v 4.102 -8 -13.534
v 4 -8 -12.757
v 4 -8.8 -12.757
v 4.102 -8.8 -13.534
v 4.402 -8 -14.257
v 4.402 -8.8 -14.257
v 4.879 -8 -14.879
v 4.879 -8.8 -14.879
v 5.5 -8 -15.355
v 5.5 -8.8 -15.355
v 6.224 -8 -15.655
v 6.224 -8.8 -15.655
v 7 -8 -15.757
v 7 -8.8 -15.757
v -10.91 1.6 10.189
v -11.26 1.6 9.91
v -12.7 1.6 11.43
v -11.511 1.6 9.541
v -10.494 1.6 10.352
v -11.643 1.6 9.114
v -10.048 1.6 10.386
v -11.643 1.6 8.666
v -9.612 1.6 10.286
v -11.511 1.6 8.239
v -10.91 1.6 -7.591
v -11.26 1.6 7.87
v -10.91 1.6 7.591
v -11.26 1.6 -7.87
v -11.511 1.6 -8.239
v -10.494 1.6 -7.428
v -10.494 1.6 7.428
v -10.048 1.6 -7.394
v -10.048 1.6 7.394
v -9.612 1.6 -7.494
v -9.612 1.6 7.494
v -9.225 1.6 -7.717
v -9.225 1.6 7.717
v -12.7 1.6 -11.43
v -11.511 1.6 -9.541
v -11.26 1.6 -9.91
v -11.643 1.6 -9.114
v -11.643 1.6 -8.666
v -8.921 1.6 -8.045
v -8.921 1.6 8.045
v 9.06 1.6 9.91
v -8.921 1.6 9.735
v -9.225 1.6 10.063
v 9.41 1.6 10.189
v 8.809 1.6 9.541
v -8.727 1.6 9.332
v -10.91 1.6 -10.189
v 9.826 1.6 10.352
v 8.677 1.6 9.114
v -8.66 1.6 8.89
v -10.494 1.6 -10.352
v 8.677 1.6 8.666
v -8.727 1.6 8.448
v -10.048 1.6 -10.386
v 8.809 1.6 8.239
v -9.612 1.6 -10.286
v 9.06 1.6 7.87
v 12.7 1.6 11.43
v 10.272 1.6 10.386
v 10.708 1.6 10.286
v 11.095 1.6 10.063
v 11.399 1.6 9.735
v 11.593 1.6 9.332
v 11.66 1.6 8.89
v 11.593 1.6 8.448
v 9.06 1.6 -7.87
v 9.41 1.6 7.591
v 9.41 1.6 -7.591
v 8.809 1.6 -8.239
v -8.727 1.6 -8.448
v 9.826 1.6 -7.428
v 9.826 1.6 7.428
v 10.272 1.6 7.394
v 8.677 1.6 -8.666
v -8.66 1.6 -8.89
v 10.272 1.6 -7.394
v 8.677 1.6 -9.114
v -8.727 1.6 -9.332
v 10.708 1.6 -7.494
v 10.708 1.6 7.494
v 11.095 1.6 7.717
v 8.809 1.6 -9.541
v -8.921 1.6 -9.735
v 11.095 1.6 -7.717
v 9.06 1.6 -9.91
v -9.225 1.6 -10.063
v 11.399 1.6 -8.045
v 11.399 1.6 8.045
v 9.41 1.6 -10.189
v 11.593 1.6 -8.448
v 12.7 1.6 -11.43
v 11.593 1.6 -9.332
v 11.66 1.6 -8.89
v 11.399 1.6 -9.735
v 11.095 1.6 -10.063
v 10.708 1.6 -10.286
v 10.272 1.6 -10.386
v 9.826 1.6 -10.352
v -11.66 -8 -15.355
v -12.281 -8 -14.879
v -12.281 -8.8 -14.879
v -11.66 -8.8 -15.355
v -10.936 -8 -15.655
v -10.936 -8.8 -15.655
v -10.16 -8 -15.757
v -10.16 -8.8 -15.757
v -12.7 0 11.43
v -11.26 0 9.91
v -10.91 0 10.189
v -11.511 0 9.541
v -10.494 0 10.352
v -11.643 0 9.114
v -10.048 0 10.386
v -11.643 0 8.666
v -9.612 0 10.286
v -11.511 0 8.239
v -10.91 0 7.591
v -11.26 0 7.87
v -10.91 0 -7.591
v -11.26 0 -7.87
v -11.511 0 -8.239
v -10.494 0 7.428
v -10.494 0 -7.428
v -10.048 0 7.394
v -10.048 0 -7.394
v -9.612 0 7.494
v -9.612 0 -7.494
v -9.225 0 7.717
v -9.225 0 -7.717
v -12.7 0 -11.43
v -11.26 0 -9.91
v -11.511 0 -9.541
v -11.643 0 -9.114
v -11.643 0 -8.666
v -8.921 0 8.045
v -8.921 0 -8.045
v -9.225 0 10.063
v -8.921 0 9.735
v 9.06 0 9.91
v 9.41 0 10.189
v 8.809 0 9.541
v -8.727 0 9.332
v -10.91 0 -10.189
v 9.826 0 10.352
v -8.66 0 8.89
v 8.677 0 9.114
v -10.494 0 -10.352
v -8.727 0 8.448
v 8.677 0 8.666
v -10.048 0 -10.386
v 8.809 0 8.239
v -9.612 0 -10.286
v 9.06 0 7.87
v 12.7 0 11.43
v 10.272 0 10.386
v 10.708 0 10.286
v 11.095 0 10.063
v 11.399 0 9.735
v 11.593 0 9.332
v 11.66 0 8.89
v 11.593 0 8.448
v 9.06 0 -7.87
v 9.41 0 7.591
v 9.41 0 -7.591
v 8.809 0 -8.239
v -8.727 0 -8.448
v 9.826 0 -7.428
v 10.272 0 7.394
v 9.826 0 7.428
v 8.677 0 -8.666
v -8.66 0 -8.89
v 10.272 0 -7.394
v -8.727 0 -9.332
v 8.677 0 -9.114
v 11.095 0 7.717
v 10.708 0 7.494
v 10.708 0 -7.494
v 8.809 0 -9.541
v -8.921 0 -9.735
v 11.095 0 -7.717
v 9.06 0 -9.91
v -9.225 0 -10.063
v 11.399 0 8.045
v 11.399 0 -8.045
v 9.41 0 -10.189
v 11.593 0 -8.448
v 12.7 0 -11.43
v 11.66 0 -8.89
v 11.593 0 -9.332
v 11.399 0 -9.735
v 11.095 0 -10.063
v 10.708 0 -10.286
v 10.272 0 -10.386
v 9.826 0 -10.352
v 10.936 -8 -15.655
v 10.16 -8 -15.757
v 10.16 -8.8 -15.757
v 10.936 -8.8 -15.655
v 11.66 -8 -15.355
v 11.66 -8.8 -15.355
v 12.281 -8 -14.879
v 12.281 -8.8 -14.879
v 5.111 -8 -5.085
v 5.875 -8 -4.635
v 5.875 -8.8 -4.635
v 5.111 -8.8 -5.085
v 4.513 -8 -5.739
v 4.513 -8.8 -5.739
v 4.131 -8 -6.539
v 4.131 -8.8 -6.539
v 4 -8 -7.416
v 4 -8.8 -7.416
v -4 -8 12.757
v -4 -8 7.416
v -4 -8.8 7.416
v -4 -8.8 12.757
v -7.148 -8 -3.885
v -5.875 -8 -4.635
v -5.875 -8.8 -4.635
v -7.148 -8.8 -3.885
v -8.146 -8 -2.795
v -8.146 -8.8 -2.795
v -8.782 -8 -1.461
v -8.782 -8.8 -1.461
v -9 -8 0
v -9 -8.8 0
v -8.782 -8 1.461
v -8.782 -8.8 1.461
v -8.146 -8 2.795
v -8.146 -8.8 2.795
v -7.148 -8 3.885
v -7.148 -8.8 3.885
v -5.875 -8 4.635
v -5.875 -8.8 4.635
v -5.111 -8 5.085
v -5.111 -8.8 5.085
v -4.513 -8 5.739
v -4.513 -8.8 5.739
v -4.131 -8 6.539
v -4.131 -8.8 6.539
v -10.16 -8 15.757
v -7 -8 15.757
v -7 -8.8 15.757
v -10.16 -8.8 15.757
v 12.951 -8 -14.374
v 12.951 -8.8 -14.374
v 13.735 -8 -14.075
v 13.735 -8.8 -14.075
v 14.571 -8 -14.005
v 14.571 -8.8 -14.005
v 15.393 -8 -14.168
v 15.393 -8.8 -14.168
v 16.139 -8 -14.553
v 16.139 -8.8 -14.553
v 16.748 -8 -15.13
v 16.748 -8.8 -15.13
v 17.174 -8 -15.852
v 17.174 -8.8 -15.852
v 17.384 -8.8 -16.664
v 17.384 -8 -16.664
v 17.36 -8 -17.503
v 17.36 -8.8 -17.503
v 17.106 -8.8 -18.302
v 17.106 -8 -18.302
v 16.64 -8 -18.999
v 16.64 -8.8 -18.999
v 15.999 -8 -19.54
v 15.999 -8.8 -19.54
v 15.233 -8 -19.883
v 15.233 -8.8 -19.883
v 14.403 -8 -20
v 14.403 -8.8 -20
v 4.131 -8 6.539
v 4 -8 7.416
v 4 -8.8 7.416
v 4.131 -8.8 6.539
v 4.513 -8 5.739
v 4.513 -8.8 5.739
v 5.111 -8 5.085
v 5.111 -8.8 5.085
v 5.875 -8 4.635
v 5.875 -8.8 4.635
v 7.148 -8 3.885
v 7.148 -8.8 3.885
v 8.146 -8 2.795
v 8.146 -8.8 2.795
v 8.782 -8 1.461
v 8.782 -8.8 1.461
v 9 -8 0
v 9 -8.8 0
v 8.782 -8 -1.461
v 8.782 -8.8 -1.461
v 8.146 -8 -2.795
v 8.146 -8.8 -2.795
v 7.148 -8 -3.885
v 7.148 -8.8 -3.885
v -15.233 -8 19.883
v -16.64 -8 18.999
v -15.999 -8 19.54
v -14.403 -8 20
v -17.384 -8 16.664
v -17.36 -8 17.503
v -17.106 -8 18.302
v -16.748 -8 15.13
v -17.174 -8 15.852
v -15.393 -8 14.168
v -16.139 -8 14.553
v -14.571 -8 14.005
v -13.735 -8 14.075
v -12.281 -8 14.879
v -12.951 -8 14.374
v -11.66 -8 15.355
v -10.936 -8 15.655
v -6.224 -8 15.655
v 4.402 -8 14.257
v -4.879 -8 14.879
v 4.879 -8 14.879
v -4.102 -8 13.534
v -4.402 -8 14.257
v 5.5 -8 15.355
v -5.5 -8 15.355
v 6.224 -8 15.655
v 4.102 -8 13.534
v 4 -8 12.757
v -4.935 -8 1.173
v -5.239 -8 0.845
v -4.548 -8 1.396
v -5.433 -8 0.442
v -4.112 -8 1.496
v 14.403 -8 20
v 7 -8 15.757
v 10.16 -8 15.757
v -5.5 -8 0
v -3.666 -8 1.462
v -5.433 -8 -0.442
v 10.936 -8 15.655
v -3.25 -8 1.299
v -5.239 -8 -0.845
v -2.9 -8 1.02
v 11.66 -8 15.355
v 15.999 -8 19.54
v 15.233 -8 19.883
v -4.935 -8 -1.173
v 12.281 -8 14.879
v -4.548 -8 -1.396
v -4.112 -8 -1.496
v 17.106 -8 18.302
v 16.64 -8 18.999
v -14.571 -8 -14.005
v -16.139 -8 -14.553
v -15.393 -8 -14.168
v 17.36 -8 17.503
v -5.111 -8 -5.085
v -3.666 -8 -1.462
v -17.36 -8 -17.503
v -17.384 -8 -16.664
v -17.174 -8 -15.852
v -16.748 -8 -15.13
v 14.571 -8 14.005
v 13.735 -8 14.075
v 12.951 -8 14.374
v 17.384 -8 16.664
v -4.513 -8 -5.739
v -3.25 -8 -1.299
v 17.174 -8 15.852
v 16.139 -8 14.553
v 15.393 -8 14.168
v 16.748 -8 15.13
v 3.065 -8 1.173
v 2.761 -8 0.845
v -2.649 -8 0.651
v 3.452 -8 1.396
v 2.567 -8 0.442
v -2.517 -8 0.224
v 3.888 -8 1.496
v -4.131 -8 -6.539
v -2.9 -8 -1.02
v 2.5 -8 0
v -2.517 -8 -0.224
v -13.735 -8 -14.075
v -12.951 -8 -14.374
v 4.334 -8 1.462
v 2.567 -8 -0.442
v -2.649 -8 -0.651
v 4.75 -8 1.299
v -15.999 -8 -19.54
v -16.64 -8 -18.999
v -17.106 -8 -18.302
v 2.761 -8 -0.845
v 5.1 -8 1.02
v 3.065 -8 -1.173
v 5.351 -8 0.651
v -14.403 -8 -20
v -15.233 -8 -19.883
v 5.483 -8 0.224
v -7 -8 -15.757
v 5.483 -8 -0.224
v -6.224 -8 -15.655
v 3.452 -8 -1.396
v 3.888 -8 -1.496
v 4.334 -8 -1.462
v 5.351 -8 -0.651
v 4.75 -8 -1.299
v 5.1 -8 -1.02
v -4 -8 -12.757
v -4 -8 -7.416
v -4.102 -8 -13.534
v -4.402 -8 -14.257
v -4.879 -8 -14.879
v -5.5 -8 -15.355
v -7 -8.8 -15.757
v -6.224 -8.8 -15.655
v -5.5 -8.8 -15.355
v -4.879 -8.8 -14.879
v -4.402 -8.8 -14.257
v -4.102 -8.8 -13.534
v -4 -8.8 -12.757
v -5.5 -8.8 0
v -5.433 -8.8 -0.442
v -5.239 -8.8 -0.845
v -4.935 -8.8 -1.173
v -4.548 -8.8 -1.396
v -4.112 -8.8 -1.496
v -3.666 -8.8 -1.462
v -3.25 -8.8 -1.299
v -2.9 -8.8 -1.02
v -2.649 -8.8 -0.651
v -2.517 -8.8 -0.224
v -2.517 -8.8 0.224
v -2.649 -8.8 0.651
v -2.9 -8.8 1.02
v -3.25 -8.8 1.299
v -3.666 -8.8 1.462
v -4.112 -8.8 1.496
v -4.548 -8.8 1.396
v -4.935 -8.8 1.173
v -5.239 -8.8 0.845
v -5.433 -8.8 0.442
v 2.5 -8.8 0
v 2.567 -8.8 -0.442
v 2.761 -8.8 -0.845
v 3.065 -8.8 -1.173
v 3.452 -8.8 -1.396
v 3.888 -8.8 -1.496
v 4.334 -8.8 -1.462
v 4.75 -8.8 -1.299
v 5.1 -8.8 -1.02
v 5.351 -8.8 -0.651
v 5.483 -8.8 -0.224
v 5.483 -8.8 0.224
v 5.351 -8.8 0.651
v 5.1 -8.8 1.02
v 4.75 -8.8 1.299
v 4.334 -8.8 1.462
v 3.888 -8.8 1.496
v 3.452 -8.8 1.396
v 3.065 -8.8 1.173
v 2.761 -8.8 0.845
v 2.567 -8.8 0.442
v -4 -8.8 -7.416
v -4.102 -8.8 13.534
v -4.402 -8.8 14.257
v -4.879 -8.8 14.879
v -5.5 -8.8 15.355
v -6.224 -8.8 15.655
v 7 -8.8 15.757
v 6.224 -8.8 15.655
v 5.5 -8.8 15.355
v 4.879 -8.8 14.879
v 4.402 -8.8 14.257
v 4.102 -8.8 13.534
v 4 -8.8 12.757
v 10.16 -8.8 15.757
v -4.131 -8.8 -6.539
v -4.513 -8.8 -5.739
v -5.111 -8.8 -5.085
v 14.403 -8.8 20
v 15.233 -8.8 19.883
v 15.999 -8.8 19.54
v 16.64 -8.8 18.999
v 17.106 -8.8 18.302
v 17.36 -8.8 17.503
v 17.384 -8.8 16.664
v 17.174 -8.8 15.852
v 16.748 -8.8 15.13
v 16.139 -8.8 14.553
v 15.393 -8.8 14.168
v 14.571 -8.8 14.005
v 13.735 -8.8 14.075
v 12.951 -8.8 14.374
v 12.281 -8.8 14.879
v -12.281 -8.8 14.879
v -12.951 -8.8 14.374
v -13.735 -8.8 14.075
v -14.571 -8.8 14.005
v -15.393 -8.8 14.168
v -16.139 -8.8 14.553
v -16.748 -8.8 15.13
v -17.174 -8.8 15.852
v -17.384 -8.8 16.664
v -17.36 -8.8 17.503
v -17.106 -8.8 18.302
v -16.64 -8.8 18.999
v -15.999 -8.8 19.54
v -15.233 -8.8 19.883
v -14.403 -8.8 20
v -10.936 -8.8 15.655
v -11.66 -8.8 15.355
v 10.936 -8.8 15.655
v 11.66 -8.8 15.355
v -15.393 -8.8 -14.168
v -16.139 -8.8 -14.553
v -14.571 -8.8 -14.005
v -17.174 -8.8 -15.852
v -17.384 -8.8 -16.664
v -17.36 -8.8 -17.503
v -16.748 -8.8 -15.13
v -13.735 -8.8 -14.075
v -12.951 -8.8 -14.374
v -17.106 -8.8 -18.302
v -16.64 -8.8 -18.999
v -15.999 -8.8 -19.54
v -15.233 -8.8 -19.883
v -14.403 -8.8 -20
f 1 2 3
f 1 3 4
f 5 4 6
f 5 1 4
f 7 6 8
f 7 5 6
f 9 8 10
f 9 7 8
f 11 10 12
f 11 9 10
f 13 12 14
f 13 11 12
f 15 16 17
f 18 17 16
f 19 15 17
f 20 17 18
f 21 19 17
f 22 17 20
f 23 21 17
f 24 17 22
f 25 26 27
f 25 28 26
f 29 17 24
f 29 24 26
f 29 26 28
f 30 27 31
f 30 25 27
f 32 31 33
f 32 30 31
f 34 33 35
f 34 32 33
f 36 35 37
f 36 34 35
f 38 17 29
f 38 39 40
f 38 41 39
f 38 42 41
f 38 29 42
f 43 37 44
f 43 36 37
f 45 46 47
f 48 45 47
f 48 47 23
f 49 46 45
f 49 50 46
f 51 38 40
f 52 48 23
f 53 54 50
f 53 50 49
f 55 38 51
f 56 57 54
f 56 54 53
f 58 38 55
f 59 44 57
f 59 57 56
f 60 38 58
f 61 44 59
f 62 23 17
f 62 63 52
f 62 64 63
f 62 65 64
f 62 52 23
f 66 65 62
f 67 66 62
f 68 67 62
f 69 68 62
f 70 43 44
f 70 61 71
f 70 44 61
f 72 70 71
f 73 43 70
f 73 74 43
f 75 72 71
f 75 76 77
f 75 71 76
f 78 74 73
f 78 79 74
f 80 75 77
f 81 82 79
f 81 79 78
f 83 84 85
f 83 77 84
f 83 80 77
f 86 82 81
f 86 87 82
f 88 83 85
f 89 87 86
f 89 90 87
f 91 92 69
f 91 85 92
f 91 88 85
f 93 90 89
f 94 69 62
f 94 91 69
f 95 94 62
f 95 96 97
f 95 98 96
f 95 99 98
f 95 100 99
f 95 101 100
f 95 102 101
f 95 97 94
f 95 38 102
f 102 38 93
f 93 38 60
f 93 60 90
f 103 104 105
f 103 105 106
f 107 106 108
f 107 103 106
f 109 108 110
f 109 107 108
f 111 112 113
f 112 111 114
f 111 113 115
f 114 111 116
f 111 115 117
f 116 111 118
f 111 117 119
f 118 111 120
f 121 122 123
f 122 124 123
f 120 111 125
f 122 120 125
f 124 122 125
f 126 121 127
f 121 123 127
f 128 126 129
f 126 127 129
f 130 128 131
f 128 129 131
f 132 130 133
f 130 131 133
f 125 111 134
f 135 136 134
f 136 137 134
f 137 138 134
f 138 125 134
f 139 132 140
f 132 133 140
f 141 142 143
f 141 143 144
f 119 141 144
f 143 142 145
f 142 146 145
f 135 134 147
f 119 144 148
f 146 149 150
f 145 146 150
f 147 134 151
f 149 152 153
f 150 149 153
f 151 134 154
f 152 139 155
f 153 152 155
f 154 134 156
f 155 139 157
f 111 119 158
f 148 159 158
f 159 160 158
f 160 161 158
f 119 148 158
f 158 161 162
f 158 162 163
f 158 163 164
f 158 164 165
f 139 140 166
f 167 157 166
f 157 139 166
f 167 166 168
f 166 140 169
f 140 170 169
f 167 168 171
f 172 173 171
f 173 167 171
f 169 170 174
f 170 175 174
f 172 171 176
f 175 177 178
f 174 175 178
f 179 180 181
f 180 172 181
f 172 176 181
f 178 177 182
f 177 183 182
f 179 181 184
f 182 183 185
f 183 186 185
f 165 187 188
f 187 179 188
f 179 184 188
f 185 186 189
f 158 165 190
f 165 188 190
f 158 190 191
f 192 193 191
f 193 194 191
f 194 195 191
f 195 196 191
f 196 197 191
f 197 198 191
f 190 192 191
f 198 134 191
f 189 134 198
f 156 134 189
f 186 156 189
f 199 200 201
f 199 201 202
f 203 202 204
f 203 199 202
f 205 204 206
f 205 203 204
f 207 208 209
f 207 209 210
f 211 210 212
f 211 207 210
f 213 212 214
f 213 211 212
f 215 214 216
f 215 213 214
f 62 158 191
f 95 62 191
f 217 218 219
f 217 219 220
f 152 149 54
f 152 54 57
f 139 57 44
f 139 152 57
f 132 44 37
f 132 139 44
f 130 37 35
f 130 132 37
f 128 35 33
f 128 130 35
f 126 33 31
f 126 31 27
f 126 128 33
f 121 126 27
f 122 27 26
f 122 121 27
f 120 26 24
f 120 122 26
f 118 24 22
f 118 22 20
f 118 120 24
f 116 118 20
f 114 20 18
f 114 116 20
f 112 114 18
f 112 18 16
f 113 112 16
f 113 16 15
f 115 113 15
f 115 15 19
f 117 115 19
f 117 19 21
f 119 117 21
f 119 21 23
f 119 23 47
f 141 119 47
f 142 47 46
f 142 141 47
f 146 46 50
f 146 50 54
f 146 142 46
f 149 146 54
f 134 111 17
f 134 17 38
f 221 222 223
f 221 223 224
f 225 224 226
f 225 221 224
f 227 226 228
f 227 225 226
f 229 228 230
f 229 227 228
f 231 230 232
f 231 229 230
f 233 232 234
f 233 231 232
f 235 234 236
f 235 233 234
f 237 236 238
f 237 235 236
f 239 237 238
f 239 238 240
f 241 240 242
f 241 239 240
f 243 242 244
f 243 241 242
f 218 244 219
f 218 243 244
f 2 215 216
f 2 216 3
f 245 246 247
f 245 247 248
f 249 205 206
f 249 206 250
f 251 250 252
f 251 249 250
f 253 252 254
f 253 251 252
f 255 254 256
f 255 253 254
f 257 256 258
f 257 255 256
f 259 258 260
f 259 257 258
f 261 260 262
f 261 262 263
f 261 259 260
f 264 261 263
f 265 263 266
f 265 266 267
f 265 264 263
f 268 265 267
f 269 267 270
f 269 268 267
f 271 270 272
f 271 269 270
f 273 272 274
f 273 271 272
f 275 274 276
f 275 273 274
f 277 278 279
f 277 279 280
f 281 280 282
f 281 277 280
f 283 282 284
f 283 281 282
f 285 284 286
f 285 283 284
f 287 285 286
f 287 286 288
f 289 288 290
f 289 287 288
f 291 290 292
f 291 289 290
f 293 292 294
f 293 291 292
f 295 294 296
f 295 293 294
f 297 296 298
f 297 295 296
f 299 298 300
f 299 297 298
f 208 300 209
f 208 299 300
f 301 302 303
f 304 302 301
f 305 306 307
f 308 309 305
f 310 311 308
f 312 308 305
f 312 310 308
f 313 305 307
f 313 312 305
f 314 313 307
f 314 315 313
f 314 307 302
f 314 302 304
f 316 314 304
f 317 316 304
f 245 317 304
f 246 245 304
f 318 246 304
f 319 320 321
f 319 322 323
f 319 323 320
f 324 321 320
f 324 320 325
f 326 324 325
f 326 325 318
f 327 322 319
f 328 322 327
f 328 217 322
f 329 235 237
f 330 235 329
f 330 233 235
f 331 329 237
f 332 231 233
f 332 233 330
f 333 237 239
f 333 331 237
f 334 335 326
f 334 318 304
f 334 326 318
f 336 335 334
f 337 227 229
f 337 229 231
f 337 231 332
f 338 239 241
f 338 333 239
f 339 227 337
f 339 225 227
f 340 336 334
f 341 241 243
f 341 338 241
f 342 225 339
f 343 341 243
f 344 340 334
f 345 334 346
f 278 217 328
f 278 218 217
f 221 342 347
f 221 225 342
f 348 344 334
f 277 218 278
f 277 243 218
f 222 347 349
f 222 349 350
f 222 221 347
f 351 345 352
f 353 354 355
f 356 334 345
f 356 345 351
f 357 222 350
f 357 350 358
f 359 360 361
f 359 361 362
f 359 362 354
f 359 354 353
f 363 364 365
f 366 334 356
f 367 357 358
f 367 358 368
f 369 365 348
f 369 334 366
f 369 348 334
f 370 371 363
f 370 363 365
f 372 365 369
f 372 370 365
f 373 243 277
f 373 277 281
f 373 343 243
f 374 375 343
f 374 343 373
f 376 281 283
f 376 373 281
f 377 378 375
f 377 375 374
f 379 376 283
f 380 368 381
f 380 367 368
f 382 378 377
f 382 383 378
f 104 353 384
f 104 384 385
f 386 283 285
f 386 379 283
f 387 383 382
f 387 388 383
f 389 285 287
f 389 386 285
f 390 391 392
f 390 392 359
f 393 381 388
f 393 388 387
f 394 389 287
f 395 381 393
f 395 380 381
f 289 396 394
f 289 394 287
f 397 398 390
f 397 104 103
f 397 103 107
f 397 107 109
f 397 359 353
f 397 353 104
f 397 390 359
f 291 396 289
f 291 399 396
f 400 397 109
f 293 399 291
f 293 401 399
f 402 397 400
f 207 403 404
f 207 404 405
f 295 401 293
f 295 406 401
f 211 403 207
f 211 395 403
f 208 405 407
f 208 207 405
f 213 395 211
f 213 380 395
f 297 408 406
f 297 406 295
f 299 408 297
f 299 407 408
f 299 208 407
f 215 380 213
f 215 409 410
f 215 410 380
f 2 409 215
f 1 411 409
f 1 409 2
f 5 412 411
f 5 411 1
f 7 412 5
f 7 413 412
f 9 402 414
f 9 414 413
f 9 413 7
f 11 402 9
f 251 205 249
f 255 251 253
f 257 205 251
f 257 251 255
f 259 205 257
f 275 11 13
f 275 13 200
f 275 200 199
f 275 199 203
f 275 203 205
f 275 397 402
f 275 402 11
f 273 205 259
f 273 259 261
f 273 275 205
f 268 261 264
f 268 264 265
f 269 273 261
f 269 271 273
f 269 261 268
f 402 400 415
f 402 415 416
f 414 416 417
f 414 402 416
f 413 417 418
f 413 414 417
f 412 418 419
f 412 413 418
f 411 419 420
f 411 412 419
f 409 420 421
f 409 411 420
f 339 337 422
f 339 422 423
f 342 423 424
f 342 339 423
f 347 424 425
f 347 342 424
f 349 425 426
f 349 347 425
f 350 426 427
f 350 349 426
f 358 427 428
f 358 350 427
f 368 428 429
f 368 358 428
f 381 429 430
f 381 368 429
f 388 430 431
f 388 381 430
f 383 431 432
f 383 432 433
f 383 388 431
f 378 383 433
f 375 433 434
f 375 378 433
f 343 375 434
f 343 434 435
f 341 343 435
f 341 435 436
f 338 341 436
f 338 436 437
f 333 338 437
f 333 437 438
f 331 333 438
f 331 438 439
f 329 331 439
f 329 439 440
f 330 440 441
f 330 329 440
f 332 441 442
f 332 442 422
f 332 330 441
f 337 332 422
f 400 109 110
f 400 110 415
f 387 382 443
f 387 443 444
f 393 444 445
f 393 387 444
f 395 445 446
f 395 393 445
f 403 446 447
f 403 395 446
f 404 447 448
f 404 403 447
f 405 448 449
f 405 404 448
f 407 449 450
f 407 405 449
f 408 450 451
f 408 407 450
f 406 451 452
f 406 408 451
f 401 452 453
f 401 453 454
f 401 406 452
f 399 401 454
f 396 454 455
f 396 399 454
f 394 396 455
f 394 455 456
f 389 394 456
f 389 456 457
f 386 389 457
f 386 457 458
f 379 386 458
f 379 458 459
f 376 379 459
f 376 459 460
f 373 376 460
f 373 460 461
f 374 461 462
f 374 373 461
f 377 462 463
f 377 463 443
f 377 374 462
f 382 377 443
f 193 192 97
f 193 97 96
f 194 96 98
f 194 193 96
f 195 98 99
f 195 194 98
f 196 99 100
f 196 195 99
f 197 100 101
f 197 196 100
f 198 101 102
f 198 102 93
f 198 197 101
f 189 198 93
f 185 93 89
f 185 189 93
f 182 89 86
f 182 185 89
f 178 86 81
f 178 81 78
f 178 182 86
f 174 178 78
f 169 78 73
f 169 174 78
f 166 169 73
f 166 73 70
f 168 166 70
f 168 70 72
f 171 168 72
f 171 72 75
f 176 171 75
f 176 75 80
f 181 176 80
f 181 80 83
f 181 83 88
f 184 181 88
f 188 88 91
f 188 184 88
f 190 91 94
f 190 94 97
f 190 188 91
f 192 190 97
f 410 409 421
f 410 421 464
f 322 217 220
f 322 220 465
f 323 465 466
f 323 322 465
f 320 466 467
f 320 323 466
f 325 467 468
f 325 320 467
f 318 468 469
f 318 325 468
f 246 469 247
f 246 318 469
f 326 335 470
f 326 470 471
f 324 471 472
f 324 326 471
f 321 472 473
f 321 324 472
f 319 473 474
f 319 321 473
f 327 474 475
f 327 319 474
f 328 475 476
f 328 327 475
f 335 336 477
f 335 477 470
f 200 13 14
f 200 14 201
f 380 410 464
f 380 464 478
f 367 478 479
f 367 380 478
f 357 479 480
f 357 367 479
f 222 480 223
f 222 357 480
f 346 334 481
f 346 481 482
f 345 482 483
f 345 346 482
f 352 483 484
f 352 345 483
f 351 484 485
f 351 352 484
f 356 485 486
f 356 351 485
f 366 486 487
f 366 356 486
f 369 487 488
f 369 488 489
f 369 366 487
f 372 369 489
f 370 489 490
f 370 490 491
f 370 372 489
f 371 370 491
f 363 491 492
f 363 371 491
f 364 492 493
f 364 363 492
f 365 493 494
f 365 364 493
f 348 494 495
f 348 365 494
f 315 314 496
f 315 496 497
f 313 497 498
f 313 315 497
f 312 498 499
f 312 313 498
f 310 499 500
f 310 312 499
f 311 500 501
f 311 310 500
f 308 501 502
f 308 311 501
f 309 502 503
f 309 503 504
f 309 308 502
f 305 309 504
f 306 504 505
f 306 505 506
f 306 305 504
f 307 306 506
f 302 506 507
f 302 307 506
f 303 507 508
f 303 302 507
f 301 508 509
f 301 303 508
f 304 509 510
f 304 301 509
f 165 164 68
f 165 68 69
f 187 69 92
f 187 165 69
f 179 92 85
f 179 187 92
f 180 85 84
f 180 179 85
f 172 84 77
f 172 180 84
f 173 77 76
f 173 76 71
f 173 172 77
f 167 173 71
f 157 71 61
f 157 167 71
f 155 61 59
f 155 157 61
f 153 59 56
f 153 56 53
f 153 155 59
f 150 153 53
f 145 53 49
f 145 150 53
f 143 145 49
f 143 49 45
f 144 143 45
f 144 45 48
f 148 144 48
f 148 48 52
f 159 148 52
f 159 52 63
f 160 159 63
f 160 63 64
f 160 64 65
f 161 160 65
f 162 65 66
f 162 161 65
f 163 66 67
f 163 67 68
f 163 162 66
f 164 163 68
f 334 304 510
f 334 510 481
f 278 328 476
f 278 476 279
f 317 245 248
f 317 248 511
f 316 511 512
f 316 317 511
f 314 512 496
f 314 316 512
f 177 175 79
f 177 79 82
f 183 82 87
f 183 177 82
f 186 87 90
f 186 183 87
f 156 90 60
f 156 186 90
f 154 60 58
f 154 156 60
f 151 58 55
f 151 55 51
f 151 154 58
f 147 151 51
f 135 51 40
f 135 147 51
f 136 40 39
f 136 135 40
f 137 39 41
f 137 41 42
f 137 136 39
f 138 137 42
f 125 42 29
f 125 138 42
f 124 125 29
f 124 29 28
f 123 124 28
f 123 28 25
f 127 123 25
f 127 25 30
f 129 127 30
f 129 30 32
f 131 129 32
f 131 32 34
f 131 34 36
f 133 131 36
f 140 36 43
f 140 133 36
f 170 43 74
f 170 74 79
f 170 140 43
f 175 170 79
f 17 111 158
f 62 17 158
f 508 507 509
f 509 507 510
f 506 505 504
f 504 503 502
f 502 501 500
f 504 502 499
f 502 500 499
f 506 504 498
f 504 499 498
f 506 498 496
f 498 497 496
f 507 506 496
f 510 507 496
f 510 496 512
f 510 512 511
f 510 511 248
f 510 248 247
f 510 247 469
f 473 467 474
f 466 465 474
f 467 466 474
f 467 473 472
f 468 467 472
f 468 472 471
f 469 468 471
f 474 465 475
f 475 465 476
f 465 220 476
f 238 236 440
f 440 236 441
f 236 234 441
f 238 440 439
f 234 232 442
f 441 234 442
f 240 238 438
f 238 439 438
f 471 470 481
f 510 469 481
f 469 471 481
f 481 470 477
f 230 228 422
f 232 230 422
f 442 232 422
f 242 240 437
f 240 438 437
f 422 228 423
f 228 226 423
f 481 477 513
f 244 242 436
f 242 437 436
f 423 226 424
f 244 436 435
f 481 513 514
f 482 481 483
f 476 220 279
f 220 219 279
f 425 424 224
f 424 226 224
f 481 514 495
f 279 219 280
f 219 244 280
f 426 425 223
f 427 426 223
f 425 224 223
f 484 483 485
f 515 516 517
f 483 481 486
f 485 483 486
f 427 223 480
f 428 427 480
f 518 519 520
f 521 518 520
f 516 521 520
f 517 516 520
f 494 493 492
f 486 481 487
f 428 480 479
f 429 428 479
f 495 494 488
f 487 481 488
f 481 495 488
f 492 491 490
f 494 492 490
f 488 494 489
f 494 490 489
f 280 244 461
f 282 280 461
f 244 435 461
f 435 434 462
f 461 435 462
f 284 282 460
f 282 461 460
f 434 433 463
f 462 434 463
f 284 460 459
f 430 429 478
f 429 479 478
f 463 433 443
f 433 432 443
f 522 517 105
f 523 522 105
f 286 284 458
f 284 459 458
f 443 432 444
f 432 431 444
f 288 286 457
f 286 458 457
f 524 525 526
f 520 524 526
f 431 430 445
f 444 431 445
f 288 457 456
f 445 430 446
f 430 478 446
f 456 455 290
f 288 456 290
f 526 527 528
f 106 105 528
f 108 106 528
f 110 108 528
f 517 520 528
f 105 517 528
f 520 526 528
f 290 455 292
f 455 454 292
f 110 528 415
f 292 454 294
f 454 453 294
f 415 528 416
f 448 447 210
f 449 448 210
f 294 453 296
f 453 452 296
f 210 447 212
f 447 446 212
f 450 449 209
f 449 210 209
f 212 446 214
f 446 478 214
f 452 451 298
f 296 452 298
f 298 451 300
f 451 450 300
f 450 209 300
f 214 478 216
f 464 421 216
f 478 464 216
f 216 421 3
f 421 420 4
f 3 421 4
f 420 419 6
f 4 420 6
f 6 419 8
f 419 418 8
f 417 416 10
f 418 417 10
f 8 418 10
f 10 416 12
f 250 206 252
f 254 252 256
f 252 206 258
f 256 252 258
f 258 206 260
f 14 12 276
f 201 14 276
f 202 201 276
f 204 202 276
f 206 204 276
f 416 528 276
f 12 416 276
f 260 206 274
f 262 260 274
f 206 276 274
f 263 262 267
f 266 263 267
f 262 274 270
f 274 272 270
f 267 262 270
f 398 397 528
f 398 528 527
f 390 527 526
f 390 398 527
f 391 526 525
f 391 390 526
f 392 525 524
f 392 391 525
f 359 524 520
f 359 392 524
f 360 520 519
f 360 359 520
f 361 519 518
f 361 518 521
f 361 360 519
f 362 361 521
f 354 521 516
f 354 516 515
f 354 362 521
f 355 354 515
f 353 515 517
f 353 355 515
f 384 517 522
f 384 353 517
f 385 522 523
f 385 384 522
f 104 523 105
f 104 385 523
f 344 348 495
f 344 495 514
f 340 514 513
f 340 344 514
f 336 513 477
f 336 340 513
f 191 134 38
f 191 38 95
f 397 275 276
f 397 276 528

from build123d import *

# Parameters (mm, degrees)
SKETCH1_W           = 25.4
SKETCH1_H           = 22.86
SKETCH1_R           = 1.5
BOSS_EXTRUDE1_DEPTH = 1.6
SKETCH10_R          = 1.5
BOSS_EXTRUDE7_DEPTH = 0.8


with BuildPart() as part:
    # Sketch1 → Boss-Extrude1 (new body)
    with BuildSketch(Plane(origin=(0, 0, 0), x_dir=(1, 0, 0), z_dir=(0, 1, 0))):
        Rectangle(SKETCH1_W, SKETCH1_H)
        with Locations((-10.16, 8.89)):
            Circle(SKETCH1_R, mode=Mode.SUBTRACT)
        with Locations((10.16, 8.89)):
            Circle(SKETCH1_R, mode=Mode.SUBTRACT)
        with Locations((10.16, -8.89)):
            Circle(SKETCH1_R, mode=Mode.SUBTRACT)
        with Locations((-10.16, -8.89)):
            Circle(SKETCH1_R, mode=Mode.SUBTRACT)
    extrude(amount=BOSS_EXTRUDE1_DEPTH)


with BuildPart() as body_2:
    # Sketch10 → Boss-Extrude7 (new body)
    with BuildSketch(Plane(origin=(0, -8, 0), x_dir=(-1, 0, 0), z_dir=(0, -1, 0))):
        with BuildLine():
            Line((-4, 7.416198487), (-4, 12.757359313))
            ThreePointArc((-4, 12.757359313), (-4.878679656, 14.878679656), (-7, 15.757359313))
            Line((-7, 15.757359313), (-10.16, 15.757359313))
            ThreePointArc((-10.16, 15.757359313), (-11.308050297, 15.52899791), (-12.281320344, 14.878679656))
            ThreePointArc((-12.281320344, 14.878679656), (-17.174279285, 15.851949703), (-14.402640687, 20))
            Line((-14.402640687, 20), (14.402640687, 20))
            ThreePointArc((14.402640687, 20), (17.174279285, 15.851949703), (12.281320344, 14.878679656))
            ThreePointArc((12.281320344, 14.878679656), (11.308050297, 15.52899791), (10.16, 15.757359313))
            Line((10.16, 15.757359313), (7, 15.757359313))
            ThreePointArc((7, 15.757359313), (4.878679656, 14.878679656), (4, 12.757359313))
            Line((4, 12.757359313), (4, 7.416198487))
            ThreePointArc((4, 7.416198487), (4.512531407, 5.739147504), (5.875, 4.635124054))
            ThreePointArc((5.875, 4.635124054), (9, 0), (5.875, -4.635124054))
            ThreePointArc((5.875, -4.635124054), (4.512531407, -5.739147504), (4, -7.416198487))
            Line((4, -7.416198487), (4, -12.757359313))
            ThreePointArc((4, -12.757359313), (4.878679656, -14.878679656), (7, -15.757359313))
            Line((7, -15.757359313), (10.16, -15.757359313))
            ThreePointArc((10.16, -15.757359313), (11.308050297, -15.52899791), (12.281320344, -14.878679656))
            ThreePointArc((12.281320344, -14.878679656), (17.174279285, -15.851949703), (14.402640687, -20))
            Line((14.402640687, -20), (-14.402640687, -20))
            ThreePointArc((-14.402640687, -20), (-17.174279285, -15.851949703), (-12.281320344, -14.878679656))
            ThreePointArc((-12.281320344, -14.878679656), (-11.308050297, -15.52899791), (-10.16, -15.757359313))
            Line((-10.16, -15.757359313), (-7, -15.757359313))
            ThreePointArc((-7, -15.757359313), (-4.878679656, -14.878679656), (-4, -12.757359313))
            Line((-4, -12.757359313), (-4, -7.416198487))
            ThreePointArc((-4, -7.416198487), (-4.512531407, -5.739147504), (-5.875, -4.635124054))
            ThreePointArc((-5.875, -4.635124054), (-9, 0), (-5.875, 4.635124054))
            ThreePointArc((-5.875, 4.635124054), (-4.512531407, 5.739147504), (-4, 7.416198487))
        make_face()
        with Locations((-4, 0)):
            Circle(SKETCH10_R, mode=Mode.SUBTRACT)
        with Locations((4, 0)):
            Circle(SKETCH10_R, mode=Mode.SUBTRACT)
    extrude(amount=BOSS_EXTRUDE7_DEPTH)


solid = Compound([part.part, body_2.part])
